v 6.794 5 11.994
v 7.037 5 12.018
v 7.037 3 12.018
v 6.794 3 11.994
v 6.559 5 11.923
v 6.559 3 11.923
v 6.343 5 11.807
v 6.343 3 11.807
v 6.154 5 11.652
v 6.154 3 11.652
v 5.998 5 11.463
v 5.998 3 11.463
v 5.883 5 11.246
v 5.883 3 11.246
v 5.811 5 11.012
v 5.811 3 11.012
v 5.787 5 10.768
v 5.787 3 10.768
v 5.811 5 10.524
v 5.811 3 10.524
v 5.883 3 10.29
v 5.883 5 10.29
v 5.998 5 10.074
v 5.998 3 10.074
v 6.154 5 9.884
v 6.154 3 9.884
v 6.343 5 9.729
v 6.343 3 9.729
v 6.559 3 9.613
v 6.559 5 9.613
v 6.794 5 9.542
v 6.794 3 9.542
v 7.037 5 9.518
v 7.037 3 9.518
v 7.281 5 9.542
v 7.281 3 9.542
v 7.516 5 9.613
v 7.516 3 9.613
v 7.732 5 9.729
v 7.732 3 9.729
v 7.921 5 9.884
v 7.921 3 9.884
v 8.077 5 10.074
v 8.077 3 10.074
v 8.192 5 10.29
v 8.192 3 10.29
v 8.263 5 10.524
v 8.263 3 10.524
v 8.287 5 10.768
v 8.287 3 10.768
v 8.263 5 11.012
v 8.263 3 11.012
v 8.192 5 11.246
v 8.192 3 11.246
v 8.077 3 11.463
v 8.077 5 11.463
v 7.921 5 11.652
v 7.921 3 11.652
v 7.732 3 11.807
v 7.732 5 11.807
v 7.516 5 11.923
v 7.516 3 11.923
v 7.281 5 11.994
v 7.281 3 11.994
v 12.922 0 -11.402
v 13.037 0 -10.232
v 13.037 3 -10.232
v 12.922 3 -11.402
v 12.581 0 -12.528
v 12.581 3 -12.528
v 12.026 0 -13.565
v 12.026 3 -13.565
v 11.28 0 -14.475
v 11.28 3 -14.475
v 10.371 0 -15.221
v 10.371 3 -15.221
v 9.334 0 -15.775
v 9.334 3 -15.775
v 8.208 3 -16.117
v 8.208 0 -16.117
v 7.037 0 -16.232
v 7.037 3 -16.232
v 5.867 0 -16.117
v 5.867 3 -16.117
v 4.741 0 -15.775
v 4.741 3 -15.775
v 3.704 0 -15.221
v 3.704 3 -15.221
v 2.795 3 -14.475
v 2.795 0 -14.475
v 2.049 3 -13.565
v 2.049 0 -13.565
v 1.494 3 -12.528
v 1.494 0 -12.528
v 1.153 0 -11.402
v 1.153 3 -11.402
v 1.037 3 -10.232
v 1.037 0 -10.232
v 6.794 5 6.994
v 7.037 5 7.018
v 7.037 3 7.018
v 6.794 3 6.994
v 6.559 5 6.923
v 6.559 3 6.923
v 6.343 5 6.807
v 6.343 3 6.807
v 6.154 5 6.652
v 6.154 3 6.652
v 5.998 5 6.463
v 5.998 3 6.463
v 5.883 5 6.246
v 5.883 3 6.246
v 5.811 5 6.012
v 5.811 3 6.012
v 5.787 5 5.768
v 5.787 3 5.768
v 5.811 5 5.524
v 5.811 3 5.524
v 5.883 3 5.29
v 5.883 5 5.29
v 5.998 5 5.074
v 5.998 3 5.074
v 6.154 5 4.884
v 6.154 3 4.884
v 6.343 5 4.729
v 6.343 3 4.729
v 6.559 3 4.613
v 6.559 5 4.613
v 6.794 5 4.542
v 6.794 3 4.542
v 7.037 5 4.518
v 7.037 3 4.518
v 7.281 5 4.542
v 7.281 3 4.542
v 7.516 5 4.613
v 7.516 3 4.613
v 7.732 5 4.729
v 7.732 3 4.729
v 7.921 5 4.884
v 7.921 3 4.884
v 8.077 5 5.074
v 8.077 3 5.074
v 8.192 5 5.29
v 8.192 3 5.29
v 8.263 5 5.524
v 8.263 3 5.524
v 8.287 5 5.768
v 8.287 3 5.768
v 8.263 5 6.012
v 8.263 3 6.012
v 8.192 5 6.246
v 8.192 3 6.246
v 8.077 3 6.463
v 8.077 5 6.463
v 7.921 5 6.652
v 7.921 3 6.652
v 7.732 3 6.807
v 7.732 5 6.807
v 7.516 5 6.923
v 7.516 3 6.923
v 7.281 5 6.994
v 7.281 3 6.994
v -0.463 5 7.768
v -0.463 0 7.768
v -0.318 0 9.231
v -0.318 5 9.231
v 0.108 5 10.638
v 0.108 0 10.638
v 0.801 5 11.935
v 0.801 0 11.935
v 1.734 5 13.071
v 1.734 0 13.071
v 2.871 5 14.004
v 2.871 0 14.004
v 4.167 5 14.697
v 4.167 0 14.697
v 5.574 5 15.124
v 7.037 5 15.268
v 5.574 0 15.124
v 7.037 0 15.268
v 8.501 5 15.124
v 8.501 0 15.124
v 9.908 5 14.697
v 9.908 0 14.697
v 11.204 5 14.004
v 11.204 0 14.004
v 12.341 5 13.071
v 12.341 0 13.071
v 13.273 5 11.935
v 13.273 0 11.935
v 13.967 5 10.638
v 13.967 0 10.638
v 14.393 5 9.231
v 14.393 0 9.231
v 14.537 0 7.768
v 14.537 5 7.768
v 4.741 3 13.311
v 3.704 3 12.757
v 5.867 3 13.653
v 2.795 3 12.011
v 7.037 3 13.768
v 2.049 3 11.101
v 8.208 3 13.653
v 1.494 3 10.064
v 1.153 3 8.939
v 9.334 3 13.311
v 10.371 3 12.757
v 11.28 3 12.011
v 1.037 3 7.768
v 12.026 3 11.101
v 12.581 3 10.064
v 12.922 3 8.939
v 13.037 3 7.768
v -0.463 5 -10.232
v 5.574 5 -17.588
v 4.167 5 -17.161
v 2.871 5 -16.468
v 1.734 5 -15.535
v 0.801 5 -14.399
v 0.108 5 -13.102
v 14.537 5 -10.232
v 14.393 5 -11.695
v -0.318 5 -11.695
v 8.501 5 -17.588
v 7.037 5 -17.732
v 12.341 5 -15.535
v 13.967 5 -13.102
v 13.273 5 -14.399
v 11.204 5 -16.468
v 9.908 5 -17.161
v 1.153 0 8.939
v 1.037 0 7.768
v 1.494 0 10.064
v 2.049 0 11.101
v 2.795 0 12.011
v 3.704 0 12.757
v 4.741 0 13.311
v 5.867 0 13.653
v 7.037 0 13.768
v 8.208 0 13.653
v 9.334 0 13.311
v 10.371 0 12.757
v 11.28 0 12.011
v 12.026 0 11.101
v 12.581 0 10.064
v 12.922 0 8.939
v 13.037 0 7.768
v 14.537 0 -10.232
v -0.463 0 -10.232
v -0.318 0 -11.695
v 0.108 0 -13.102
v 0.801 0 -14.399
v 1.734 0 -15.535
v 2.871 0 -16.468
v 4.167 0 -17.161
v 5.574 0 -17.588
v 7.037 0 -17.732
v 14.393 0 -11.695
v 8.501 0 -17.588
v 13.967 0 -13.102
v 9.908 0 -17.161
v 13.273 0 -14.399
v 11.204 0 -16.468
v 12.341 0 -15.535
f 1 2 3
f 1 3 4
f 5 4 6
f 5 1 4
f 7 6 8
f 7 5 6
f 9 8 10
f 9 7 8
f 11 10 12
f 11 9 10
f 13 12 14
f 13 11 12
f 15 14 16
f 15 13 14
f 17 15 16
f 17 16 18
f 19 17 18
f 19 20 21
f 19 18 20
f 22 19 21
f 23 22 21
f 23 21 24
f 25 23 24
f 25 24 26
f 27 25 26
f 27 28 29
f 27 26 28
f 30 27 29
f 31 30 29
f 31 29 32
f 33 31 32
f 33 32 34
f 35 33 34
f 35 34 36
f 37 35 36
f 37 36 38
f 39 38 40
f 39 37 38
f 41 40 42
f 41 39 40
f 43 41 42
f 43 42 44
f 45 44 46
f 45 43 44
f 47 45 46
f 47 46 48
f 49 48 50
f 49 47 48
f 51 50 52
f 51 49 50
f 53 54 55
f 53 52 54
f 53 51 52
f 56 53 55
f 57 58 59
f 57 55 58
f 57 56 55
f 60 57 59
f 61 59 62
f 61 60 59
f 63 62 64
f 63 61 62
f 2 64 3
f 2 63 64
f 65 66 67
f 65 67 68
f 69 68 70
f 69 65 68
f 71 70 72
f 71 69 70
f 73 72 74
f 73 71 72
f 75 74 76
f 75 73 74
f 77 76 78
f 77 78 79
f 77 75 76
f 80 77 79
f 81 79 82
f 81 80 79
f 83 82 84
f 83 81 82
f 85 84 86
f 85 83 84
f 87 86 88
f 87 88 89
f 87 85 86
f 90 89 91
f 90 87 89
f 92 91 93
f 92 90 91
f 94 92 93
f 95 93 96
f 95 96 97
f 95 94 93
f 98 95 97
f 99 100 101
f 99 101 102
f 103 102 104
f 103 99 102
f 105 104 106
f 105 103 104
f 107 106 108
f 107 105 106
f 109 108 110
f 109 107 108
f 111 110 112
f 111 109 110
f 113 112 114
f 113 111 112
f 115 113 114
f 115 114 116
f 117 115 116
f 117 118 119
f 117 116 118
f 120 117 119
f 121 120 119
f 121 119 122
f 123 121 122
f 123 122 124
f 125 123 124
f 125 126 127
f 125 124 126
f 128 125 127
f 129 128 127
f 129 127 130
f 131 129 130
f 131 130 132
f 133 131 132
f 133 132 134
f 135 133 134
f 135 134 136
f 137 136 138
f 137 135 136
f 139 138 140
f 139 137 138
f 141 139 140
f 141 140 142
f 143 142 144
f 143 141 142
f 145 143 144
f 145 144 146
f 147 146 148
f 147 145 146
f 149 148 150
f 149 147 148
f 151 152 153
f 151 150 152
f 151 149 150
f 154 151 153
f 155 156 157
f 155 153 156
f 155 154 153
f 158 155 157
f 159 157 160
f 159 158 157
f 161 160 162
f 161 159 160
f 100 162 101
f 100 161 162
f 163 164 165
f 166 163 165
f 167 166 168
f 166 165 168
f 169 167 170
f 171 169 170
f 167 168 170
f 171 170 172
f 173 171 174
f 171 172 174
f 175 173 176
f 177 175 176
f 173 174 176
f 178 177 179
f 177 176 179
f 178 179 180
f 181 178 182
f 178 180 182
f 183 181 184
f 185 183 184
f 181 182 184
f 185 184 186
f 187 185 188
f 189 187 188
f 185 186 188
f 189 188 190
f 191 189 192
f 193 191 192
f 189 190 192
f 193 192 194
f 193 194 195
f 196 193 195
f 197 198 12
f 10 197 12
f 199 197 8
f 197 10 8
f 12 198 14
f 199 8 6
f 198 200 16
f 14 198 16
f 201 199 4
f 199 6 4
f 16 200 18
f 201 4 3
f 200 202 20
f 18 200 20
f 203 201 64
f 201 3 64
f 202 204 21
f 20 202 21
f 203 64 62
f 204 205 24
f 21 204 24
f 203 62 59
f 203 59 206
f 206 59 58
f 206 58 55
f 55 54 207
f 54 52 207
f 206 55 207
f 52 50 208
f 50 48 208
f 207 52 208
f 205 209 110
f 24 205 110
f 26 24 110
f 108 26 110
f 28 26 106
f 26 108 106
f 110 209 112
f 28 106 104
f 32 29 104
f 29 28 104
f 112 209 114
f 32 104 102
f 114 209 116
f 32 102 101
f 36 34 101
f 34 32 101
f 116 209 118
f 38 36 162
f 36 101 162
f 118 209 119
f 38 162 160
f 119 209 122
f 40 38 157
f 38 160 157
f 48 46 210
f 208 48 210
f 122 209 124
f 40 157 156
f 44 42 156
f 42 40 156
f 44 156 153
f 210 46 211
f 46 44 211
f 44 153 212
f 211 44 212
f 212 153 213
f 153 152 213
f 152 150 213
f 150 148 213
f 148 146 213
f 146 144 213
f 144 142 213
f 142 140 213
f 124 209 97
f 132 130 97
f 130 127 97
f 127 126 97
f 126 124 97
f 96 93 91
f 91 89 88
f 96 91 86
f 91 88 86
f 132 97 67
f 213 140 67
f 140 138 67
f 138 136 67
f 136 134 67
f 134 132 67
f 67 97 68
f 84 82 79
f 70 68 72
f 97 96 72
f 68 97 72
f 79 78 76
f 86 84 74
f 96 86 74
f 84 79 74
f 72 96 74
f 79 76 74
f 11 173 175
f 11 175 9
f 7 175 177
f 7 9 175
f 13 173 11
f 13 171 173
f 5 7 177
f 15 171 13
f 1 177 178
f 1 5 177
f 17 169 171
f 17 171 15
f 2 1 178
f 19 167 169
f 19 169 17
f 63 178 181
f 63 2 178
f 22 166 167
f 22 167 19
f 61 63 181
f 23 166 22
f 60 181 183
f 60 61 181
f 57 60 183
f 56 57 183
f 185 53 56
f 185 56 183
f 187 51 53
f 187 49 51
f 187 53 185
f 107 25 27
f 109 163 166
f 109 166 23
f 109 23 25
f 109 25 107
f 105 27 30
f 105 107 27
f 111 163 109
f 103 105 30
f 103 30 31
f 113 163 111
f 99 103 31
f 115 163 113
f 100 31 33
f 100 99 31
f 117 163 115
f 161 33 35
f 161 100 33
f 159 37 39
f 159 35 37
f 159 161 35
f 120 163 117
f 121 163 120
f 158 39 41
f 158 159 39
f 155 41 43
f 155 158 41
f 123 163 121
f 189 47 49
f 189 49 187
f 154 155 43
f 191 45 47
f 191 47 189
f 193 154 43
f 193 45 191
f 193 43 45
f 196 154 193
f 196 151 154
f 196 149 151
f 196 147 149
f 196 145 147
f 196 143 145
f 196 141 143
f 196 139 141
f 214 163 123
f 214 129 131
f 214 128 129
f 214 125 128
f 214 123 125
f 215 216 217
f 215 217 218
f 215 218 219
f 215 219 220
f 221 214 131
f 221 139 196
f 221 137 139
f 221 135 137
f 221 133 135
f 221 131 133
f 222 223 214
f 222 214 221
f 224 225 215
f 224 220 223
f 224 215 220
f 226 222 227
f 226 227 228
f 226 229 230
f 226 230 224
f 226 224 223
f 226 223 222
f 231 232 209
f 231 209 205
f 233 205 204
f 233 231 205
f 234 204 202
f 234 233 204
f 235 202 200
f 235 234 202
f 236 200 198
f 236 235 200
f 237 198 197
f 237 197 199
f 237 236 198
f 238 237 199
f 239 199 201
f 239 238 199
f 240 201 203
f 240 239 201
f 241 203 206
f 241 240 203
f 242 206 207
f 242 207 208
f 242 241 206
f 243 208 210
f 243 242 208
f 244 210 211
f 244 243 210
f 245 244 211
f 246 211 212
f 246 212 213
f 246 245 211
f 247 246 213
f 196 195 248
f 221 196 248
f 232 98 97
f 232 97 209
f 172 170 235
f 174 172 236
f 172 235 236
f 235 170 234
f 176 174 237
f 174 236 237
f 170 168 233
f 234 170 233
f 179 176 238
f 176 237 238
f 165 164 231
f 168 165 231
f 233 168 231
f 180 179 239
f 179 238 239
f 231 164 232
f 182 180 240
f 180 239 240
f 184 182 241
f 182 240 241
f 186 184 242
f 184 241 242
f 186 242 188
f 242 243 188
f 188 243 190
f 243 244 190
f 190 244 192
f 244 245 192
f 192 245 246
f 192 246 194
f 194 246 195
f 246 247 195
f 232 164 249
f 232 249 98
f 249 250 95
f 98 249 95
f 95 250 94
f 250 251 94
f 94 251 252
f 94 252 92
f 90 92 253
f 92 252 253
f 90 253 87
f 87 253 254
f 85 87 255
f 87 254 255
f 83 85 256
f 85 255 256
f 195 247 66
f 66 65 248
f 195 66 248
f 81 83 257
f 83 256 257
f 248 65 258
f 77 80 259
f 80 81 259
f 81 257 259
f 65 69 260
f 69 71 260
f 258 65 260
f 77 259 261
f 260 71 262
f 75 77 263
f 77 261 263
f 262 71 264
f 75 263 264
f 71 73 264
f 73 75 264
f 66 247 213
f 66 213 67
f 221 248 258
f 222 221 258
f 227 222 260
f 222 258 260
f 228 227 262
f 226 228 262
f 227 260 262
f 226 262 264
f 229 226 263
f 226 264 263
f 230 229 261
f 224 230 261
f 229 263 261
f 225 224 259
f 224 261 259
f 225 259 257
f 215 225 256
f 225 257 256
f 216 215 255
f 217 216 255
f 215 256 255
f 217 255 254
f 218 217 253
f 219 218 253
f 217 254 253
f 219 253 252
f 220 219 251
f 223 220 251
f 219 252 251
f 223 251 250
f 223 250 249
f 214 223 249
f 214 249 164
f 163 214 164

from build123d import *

# Parameters (mm, degrees)
BOSS_EXTRUDE2_DEPTH     = 5
CUT_EXTRUDE2_DEPTH      = 3
CUT_EXTRUDE3_DEPTH      = 24.124843106
CUT_EXTRUDE3_DEPTH_BACK = 3
SKETCH4_R               = 1.25


with BuildPart() as part:
    # Sketch3 → Boss-Extrude2 (new body)
    with BuildSketch(Plane(origin=(0, 0, 0), x_dir=(1, 0, 0), z_dir=(0, 1, 0))):
        with BuildLine():
            Line((-0.462577175, 10.231940285), (-0.462577175, -7.768059715))
            ThreePointArc((-0.462577175, -7.768059715), (7.037422825, -15.268059715), (14.537422825, -7.768059715))
            Line((14.537422825, -7.768059715), (14.537422825, 10.231940285))
            ThreePointArc((14.537422825, 10.231940285), (7.037422825, 17.731940285), (-0.462577175, 10.231940285))
        make_face()
    extrude(amount=BOSS_EXTRUDE2_DEPTH)

    # Sketch2 → Cut-Extrude2 (cut)
    with BuildSketch(Plane(origin=(0, 0, 0), x_dir=(1, 0, 0), z_dir=(0, 1, 0))):
        with BuildLine():
            Line((1.037422825, 10.231940285), (1.037422825, -7.768059715))
            ThreePointArc((1.037422825, -7.768059715), (7.037422825, -13.768059715), (13.037422825, -7.768059715))
            Line((13.037422825, -7.768059715), (13.037422825, 10.231940285))
            ThreePointArc((13.037422825, 10.231940285), (7.037422825, 16.231940285), (1.037422825, 10.231940285))
        make_face()
    extrude(amount=CUT_EXTRUDE2_DEPTH, mode=Mode.SUBTRACT)

    # Sketch4 → Cut-Extrude3 (cut, two sides: drawn at the far end of the back side and taken through both)
    with BuildSketch(Plane.XZ.offset(-3).offset(-CUT_EXTRUDE3_DEPTH_BACK)):
        with Locations(Location((7.037422825, 10.768059715, 0), (0, 0, 90))):
            Circle(SKETCH4_R)
        with Locations(Location((7.037422825, 5.768059715, 0), (0, 0, 90))):
            Circle(SKETCH4_R)
    extrude(amount=CUT_EXTRUDE3_DEPTH + CUT_EXTRUDE3_DEPTH_BACK, mode=Mode.SUBTRACT)


solid = part.part
